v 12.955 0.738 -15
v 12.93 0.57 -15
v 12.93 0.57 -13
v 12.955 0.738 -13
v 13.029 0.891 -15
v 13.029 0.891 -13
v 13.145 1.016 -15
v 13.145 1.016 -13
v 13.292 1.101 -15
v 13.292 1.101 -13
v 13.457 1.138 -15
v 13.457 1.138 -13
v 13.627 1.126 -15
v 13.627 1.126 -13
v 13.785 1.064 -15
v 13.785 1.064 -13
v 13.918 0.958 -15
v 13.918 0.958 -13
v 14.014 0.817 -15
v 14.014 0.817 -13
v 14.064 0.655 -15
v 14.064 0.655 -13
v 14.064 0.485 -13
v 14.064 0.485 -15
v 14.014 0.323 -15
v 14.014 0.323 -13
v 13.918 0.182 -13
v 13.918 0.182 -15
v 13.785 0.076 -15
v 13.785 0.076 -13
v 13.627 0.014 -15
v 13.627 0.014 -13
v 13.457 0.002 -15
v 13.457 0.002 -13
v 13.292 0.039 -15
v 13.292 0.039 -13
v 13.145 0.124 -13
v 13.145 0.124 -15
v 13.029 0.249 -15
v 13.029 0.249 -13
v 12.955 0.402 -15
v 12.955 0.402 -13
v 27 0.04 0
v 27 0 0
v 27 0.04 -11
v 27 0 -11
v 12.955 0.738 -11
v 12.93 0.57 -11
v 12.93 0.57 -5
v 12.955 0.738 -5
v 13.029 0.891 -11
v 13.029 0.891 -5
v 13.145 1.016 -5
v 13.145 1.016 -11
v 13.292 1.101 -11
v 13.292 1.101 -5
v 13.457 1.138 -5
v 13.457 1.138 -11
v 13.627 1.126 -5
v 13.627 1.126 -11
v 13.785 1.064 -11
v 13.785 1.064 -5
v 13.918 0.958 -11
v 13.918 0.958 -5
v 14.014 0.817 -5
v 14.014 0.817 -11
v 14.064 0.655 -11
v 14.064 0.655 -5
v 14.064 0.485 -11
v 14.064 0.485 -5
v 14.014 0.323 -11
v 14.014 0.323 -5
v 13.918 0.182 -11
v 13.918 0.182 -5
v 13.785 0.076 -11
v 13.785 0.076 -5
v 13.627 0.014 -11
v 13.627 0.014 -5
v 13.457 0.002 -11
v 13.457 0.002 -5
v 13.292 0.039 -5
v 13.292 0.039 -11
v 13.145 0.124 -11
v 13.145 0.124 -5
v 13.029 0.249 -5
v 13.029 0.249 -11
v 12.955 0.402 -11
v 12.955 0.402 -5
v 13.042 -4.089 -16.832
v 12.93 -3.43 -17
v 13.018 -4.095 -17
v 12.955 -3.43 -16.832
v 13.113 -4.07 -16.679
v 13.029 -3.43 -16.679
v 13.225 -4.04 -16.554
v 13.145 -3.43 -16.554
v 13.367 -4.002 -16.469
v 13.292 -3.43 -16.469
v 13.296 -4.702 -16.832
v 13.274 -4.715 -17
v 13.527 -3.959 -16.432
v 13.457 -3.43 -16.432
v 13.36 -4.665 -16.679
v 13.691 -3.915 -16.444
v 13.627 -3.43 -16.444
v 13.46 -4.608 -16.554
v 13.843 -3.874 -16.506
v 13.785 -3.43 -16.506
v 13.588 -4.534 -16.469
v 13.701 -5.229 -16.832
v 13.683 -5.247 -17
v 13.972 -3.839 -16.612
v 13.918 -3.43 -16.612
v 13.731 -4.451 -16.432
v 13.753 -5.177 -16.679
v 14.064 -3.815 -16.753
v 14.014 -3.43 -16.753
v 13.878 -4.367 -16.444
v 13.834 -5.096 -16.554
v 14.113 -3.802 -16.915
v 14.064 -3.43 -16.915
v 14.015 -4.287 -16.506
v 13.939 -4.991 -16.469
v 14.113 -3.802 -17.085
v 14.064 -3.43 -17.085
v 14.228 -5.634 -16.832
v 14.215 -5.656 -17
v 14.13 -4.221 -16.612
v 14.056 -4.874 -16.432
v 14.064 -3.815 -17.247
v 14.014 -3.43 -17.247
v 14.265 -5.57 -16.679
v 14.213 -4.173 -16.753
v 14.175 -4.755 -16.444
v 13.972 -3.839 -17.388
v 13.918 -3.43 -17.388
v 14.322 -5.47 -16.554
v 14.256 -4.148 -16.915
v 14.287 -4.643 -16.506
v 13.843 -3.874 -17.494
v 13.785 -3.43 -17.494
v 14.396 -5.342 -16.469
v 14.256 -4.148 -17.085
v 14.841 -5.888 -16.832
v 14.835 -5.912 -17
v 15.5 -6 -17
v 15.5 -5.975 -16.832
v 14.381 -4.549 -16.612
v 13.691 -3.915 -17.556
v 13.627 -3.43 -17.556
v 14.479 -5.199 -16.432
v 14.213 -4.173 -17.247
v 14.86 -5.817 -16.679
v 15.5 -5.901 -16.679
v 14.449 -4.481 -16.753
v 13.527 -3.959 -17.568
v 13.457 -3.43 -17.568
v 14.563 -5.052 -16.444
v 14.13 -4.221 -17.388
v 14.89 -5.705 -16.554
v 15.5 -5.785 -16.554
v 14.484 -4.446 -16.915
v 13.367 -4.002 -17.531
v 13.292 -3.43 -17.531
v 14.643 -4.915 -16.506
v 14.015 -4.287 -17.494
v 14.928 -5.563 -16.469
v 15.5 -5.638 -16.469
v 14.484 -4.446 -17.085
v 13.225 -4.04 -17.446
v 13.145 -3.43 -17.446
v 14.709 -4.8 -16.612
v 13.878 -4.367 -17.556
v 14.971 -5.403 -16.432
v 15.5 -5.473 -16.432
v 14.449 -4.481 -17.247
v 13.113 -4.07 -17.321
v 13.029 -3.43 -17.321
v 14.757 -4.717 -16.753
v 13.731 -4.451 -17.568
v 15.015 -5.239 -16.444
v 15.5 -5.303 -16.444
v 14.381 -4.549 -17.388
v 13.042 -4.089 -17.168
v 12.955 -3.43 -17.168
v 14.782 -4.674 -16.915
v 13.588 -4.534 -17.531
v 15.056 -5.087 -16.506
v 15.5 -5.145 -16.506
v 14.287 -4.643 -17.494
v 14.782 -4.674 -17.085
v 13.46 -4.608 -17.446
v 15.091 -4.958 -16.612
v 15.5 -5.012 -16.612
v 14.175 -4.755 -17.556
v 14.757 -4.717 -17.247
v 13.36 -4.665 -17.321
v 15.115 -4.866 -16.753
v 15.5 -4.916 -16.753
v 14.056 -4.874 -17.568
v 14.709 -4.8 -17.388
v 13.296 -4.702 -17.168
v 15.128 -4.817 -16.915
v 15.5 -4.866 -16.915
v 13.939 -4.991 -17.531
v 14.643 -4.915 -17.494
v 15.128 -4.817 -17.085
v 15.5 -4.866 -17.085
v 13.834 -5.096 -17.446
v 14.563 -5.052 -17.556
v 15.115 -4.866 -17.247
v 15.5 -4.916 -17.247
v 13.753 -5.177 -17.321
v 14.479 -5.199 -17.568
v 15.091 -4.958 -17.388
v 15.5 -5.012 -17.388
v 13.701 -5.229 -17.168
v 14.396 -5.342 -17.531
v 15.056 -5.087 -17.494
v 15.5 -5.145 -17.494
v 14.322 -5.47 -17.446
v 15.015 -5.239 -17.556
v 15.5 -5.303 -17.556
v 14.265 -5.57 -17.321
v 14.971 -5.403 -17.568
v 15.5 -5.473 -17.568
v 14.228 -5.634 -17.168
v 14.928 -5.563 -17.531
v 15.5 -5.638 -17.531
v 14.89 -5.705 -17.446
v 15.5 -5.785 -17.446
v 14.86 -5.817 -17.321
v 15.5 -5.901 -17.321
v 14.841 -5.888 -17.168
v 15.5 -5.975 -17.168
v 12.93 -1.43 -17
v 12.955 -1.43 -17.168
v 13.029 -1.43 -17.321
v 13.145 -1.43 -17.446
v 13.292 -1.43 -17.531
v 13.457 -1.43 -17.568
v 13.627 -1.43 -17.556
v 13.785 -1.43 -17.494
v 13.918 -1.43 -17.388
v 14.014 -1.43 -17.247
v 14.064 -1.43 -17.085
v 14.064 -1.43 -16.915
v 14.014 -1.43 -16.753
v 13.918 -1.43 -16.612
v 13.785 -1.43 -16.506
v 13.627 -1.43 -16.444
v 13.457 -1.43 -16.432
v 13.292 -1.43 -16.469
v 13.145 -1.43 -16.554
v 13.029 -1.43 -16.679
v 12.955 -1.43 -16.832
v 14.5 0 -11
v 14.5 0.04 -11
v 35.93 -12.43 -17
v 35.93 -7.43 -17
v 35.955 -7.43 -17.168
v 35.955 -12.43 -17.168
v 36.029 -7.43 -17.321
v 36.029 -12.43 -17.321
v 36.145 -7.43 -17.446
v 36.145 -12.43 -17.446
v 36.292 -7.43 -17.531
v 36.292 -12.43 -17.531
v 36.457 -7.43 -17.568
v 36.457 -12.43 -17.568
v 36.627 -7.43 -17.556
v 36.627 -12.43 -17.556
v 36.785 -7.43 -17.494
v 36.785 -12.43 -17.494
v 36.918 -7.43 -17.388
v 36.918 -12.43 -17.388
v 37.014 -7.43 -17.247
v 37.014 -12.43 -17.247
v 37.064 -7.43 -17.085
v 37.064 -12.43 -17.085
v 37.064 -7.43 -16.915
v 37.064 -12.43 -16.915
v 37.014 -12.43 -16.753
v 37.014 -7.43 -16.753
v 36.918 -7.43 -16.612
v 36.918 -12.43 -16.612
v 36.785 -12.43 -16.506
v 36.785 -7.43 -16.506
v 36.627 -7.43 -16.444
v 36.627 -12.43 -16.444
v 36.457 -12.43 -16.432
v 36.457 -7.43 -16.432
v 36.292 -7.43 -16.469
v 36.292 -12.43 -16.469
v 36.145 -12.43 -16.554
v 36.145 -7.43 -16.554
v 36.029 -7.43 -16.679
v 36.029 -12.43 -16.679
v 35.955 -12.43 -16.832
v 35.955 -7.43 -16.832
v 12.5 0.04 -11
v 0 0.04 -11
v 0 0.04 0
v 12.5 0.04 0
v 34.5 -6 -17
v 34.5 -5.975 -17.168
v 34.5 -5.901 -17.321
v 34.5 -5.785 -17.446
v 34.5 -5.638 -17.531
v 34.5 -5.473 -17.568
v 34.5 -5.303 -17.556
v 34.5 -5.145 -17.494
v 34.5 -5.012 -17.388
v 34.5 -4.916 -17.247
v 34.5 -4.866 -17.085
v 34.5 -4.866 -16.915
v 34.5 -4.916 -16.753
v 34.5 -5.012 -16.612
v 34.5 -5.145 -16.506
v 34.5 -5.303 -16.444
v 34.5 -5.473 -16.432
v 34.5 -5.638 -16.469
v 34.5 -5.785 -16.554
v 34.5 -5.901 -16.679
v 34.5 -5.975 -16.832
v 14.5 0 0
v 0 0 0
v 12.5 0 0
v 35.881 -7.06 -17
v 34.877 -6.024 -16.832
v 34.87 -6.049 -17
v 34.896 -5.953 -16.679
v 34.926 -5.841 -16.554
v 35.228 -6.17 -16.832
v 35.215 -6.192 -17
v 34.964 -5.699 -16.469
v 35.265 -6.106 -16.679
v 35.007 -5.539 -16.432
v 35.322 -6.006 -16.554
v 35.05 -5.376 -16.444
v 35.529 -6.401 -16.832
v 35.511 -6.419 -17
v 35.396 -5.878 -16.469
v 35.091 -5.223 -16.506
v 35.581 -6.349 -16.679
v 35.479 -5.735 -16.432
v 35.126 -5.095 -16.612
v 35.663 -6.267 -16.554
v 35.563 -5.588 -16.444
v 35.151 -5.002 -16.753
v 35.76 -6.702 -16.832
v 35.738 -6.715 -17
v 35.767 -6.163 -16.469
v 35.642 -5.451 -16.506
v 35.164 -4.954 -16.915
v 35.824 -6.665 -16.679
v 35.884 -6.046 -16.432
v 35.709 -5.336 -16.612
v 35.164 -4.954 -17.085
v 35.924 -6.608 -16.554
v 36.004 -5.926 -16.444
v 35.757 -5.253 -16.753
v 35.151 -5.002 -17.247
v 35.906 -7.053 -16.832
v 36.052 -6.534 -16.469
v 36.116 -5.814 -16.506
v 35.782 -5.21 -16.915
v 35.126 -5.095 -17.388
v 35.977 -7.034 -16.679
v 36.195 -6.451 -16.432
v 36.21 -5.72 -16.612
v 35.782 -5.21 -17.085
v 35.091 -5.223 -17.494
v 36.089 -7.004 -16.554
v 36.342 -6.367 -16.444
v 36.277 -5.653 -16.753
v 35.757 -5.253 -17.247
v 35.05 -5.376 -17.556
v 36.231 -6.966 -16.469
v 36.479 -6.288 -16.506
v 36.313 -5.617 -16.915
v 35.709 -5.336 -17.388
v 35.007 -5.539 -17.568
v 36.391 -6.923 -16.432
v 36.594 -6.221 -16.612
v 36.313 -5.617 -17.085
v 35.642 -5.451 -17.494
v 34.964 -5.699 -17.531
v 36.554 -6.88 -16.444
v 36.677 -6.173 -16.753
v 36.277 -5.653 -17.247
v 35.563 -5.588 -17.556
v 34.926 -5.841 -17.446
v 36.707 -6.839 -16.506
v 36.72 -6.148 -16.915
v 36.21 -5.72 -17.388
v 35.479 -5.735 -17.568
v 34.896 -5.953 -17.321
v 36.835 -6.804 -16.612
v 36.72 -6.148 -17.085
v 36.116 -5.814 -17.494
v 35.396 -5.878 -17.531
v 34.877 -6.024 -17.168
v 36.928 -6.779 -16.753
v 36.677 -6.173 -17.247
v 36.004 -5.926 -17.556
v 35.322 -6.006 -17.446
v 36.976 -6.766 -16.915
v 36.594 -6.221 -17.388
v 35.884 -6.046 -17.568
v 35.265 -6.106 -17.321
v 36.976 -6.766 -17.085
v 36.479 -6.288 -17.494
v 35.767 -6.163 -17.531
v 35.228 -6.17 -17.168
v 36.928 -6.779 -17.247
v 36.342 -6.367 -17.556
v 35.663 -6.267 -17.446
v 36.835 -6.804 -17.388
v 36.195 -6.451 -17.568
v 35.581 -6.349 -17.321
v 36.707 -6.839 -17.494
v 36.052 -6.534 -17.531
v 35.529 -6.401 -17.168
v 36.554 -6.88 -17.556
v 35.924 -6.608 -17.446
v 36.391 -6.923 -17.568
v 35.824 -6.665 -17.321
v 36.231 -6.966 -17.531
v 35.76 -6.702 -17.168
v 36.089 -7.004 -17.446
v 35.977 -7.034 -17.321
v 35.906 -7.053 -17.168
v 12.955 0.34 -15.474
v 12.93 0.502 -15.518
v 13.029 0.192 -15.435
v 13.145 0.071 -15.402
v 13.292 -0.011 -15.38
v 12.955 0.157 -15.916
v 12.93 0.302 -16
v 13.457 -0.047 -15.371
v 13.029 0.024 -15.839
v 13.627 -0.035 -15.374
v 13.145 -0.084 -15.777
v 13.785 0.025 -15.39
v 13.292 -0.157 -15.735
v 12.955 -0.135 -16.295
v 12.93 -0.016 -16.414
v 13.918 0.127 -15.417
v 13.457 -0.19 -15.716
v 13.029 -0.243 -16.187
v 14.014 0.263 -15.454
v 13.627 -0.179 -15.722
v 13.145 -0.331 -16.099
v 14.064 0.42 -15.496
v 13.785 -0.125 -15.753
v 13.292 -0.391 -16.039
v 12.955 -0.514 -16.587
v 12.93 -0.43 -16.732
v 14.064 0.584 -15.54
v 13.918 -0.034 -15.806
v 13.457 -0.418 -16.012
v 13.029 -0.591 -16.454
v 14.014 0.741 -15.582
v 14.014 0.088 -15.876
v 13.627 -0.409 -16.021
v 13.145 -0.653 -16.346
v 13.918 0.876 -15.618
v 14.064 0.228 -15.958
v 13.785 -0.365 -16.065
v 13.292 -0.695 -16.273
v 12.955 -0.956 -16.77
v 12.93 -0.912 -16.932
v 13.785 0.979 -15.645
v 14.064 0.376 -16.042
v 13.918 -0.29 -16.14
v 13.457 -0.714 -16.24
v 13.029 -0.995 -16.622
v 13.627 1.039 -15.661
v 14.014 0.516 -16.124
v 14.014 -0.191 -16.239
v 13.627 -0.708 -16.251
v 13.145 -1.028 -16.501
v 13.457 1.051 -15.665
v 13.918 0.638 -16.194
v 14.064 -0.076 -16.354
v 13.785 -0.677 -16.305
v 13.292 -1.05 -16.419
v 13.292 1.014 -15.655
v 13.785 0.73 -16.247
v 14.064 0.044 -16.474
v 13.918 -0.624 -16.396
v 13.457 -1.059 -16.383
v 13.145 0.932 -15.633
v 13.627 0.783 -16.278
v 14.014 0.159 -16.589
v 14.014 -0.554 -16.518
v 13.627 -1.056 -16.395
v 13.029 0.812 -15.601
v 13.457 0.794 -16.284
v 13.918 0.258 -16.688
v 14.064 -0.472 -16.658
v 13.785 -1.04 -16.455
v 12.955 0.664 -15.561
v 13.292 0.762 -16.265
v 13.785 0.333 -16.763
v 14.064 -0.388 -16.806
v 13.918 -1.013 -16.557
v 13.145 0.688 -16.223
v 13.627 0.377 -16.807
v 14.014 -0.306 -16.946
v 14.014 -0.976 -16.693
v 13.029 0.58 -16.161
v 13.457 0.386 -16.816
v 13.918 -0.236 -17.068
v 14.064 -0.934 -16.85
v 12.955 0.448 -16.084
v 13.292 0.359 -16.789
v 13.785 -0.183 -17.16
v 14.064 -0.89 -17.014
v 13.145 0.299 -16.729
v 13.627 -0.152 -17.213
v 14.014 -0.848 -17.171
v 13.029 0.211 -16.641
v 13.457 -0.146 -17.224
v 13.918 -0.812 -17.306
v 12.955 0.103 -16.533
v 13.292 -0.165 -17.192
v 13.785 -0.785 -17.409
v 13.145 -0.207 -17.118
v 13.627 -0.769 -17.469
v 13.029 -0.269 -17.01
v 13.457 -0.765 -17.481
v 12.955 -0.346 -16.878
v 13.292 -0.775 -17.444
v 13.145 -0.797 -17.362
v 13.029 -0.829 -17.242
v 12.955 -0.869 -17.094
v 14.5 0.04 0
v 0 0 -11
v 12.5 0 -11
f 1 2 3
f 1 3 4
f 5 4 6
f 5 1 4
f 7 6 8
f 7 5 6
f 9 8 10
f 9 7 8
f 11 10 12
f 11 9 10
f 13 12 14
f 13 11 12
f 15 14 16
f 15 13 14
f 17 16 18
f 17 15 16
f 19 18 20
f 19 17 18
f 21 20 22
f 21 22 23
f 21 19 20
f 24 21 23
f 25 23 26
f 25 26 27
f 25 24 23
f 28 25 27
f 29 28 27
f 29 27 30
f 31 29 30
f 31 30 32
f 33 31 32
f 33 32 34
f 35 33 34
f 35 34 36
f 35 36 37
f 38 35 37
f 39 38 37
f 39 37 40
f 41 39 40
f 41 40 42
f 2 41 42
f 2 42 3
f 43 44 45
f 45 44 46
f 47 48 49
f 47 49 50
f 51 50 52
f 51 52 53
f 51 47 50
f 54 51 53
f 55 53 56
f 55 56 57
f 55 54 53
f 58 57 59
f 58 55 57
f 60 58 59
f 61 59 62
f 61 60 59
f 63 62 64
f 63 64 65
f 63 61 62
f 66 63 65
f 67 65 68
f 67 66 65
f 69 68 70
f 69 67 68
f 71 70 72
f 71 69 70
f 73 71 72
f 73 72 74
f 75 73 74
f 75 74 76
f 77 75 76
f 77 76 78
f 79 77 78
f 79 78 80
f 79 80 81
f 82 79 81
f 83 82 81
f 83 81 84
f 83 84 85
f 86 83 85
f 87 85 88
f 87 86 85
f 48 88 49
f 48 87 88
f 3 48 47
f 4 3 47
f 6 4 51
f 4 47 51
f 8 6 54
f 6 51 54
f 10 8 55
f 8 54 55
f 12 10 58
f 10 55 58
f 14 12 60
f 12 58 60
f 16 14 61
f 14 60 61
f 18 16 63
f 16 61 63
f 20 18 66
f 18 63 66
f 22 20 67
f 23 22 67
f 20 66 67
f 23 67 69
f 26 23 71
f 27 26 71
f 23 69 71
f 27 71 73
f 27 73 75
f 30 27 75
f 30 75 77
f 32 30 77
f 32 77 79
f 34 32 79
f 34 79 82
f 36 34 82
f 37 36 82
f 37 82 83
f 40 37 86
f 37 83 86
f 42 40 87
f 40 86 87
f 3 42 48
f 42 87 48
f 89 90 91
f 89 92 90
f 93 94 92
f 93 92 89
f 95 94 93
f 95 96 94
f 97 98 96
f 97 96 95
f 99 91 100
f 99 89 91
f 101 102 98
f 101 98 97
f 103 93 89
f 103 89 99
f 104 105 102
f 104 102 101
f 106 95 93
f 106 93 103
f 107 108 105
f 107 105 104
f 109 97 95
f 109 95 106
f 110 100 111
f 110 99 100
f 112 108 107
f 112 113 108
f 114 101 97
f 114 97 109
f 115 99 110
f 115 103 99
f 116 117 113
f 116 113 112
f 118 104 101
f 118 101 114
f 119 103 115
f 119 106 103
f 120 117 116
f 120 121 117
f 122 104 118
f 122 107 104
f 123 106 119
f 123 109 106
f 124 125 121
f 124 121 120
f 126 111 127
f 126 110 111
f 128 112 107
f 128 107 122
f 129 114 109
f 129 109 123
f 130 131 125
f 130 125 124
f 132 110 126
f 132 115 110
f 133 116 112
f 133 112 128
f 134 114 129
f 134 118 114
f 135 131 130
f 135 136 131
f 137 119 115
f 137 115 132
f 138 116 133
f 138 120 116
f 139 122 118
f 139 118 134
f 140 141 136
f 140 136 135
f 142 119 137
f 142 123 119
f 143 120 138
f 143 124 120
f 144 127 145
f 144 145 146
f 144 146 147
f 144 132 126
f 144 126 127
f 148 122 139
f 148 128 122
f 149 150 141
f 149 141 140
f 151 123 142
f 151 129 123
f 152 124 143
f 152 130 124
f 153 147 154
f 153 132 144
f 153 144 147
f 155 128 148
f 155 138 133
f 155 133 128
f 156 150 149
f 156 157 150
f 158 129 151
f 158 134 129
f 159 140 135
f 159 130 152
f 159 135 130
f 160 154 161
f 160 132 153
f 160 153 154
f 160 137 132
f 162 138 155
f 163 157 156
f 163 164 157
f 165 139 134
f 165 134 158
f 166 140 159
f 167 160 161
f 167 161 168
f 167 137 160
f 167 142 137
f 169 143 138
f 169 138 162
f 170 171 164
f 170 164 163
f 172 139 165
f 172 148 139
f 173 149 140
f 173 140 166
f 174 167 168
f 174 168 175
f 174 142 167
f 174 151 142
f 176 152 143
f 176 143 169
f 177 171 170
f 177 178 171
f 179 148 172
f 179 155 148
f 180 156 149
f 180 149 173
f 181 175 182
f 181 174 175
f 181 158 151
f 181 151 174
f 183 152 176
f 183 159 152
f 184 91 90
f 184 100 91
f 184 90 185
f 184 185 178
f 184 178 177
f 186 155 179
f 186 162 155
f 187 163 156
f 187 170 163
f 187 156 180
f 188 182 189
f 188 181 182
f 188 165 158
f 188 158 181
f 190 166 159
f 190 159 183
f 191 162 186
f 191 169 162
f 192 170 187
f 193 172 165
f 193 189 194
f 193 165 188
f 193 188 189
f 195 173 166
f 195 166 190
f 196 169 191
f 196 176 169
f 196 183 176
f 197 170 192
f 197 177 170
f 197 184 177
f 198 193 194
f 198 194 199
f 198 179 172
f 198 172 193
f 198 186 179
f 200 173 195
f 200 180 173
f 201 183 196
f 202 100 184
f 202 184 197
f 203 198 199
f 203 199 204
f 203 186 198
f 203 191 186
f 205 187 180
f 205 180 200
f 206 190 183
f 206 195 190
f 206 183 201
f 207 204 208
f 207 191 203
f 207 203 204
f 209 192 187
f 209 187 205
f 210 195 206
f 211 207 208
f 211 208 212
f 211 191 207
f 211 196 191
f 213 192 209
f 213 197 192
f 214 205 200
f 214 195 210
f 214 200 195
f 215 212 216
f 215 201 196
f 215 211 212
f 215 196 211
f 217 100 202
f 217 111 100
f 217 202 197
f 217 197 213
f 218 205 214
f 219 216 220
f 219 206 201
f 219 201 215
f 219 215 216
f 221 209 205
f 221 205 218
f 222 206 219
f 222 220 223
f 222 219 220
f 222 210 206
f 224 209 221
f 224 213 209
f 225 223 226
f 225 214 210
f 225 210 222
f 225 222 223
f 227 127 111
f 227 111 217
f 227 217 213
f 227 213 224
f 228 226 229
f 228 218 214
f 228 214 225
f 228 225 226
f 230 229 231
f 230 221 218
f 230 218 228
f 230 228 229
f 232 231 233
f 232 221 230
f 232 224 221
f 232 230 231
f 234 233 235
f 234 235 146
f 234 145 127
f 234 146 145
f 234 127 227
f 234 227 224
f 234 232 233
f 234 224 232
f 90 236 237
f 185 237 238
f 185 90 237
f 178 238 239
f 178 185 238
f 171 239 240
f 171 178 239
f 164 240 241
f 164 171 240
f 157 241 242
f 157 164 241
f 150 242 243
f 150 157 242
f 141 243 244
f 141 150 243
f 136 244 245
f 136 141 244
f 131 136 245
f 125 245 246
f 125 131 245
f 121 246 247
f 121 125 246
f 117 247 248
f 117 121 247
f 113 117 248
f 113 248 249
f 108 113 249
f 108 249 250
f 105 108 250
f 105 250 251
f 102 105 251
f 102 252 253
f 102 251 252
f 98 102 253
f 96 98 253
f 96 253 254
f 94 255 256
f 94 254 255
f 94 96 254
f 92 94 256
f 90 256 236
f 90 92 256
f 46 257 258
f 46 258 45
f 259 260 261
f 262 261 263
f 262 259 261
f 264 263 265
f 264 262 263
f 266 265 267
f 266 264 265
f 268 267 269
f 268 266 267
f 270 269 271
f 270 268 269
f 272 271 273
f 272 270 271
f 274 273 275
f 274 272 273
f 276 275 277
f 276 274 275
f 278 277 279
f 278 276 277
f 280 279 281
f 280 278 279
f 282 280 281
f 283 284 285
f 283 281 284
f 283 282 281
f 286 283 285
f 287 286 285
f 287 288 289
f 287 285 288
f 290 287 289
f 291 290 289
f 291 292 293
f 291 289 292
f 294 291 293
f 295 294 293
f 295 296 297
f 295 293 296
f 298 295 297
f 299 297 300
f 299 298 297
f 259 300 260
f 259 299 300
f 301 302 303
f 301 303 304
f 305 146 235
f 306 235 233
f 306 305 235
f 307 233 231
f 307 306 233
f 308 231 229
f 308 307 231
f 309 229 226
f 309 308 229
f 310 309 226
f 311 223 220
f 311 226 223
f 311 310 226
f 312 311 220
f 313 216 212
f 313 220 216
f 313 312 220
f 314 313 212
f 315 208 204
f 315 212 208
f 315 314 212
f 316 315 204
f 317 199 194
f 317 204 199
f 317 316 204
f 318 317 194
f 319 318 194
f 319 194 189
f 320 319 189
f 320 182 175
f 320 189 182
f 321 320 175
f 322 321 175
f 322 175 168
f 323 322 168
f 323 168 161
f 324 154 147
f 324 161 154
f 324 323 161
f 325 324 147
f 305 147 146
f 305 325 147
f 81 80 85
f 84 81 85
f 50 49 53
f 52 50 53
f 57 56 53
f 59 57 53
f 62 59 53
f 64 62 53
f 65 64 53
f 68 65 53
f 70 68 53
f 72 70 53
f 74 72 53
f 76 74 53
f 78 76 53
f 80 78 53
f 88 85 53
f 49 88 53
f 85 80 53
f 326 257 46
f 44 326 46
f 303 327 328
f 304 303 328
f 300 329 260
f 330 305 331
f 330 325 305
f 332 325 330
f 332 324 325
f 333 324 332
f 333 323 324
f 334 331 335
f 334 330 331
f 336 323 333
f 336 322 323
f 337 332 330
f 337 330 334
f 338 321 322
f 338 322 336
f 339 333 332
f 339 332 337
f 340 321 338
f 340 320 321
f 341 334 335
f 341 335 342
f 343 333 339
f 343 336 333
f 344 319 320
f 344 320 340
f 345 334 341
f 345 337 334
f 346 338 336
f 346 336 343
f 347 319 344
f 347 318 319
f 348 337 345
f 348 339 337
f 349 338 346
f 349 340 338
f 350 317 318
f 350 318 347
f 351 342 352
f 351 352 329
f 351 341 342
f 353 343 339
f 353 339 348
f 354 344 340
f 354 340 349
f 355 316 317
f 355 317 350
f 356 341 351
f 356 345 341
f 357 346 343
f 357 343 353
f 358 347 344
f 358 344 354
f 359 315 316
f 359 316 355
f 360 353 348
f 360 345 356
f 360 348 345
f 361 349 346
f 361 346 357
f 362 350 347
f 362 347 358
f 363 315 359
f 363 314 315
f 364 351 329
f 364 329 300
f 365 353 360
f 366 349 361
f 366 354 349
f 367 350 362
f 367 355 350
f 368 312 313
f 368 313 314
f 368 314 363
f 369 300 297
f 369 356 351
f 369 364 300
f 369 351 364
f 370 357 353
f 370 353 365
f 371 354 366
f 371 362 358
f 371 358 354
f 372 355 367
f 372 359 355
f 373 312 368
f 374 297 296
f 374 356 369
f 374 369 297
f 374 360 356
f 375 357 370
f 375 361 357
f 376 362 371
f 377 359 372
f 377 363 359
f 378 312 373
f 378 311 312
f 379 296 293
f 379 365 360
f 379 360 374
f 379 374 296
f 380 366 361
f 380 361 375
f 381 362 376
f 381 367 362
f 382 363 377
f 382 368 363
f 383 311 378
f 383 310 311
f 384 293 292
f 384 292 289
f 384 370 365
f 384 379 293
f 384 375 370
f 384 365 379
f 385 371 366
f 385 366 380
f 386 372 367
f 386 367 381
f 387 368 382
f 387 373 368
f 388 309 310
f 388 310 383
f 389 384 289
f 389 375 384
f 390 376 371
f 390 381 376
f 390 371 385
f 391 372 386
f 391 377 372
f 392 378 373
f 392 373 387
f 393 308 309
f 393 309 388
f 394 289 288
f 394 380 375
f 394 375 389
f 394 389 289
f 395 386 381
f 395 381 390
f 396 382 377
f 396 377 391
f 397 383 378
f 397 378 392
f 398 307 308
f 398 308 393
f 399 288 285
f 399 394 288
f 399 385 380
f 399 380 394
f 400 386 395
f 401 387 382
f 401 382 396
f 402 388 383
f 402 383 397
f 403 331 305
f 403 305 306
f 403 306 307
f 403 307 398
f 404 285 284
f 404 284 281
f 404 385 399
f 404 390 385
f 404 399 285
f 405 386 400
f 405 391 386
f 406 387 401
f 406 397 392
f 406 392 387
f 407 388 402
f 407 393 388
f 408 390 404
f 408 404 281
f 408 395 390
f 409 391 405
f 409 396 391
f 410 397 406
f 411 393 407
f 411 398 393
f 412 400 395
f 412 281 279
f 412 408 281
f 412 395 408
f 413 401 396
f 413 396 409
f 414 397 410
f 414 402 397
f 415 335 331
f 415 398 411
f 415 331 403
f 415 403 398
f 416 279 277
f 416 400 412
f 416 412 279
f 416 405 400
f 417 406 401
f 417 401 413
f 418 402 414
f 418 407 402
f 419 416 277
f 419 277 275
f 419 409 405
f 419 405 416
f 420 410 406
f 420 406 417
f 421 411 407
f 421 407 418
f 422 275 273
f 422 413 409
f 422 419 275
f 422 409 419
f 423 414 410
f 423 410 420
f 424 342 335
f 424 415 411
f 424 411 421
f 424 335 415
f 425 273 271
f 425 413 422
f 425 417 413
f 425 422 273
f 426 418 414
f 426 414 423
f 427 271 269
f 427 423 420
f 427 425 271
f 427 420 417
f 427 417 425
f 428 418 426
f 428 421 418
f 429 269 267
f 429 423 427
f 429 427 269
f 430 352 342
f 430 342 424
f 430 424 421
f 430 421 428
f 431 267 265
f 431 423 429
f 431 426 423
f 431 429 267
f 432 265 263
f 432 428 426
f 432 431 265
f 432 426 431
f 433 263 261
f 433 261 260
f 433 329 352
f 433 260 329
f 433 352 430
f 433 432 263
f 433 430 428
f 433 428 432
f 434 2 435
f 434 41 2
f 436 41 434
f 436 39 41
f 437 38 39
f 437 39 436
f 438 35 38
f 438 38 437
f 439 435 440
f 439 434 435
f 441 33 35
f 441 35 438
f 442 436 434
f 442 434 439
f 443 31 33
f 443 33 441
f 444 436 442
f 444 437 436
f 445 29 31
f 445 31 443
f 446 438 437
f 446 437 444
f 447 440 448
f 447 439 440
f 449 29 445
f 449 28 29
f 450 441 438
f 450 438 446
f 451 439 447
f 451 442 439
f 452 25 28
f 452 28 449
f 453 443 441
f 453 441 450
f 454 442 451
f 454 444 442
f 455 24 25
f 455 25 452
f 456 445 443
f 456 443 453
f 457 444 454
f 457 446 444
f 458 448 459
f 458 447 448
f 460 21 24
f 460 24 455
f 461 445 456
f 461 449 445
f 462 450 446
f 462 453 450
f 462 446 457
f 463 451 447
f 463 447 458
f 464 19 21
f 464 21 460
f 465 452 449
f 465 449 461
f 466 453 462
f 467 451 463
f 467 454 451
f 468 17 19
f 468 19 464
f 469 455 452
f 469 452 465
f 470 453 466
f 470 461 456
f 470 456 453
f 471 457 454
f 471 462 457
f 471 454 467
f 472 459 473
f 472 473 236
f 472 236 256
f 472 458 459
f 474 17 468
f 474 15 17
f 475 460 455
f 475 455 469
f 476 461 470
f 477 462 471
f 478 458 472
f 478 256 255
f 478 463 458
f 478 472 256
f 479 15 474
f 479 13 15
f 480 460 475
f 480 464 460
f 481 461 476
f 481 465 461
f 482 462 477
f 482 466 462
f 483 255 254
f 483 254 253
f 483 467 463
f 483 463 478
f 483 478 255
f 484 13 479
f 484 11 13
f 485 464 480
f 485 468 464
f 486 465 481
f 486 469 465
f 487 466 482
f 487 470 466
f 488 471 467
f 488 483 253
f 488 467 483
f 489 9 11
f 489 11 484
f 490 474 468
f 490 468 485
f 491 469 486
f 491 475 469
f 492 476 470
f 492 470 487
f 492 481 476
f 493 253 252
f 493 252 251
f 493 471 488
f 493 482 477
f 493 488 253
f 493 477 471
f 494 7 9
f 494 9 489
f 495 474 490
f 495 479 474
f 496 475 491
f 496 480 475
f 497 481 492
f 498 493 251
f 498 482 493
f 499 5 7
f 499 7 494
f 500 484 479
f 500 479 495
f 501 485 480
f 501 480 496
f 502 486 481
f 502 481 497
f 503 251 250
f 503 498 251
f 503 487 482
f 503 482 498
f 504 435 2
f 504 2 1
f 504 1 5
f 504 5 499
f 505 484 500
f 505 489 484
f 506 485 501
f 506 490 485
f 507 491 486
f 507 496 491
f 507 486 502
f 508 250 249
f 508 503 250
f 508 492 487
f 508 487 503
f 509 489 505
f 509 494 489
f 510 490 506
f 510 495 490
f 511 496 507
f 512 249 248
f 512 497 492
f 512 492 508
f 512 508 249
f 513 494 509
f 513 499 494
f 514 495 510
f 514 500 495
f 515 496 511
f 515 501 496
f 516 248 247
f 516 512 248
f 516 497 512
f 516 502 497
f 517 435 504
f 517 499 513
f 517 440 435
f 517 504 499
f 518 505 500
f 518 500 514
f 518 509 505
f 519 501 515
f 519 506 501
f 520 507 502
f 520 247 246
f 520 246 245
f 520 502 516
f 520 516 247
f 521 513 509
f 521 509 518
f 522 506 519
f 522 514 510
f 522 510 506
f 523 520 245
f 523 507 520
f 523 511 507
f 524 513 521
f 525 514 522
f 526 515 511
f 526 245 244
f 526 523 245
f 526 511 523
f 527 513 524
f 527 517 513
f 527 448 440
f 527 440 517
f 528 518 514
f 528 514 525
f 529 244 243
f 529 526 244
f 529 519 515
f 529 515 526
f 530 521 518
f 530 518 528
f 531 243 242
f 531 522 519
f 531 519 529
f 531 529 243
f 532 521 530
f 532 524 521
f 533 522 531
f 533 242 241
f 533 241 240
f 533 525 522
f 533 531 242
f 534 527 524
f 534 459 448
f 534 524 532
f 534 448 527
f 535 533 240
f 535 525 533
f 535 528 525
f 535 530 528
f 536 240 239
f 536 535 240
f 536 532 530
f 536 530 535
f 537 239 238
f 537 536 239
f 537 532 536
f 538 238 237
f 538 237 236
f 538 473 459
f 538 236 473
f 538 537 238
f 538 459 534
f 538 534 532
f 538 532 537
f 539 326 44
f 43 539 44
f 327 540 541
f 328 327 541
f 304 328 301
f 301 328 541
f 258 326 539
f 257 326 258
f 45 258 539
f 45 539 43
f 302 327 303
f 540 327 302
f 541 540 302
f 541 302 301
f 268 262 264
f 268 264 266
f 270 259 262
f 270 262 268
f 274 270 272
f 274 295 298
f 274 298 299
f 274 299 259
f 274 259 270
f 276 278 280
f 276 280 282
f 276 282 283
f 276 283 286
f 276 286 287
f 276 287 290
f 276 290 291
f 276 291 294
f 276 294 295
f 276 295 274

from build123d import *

# Parameters (mm, degrees)
SKETCH_1_W        = 12.5
SKETCH_1_H        = 11
EXTRUDE_1_DEPTH   = 0.04
EXTRUDE_1_2_DEPTH = 0.04
SKETCH_2_R        = 0.57
EXTRUDE_2_DEPTH   = 6
SKETCH_3_R        = 0.57
EXTRUDE_3_DEPTH   = 2
SKETCH_5_R        = 0.57


with BuildPart() as part:
    # Эскиз1 → Бобышка-Вытянуть1 (new body)
    with BuildSketch(Plane(origin=(0, 0, 0), x_dir=(1, 0, 0), z_dir=(0, 1, 0))):
        with Locations((6.25, 5.5)):
            Rectangle(SKETCH_1_W, SKETCH_1_H)
    extrude(amount=EXTRUDE_1_DEPTH)


with BuildPart() as body_2:
    # Эскиз1 → Extrude 1 2 (new body)
    with BuildSketch(Plane(origin=(0, 0, 0), x_dir=(1, 0, 0), z_dir=(0, 1, 0))):
        with Locations((20.75, 5.5)):
            Rectangle(SKETCH_1_W, SKETCH_1_H)
    extrude(amount=EXTRUDE_1_2_DEPTH)


with BuildPart() as body_3:
    # Эскиз2 → Бобышка-Вытянуть2 (new body)
    with BuildSketch(Plane(origin=(0, 0, -11), x_dir=(-1, 0, 0), z_dir=(0, 0, -1))):
        with Locations((-13.5, 0.57)):
            Circle(SKETCH_2_R)
    extrude(amount=-EXTRUDE_2_DEPTH)

    # Эскиз3 → Бобышка-Вытянуть3 (add)
    with BuildSketch(Plane(origin=(0, 0, -11), x_dir=(-1, 0, 0), z_dir=(0, 0, -1))):
        with Locations((-13.5, 0.57)):
            Circle(SKETCH_3_R)
    extrude(amount=EXTRUDE_3_DEPTH)

    # По траектории1: sweep along a curve in space
    with BuildLine() as sweep_1_path:
        Line((13.5, 0.57, -13), (13.5, 0.57, -15))
        ThreePointArc((13.5, -1.43, -17), (13.5, -0.015786438, -16.414213562), (13.5, 0.57, -15))
        Line((13.5, -1.43, -17), (13.5, -3.43, -17))
        ThreePointArc((15.5, -5.43, -17), (14.085786438, -4.844213562, -17), (13.5, -3.43, -17))
        Line((15.5, -5.43, -17), (34.5, -5.43, -17))
        ThreePointArc((36.5, -7.43, -17), (35.914213562, -6.015786438, -17), (34.5, -5.43, -17))
        Line((36.5, -7.43, -17), (36.5, -12.43, -17))
    # Эскиз5 → По траектории1 (sweep)
    with BuildSketch(Plane(origin=(0, 0, -13), x_dir=(-1, 0, 0), z_dir=(0, 0, -1))):
        with Locations((-13.5, 0.57)):
            Circle(SKETCH_5_R)
    sweep(path=sweep_1_path.line)


solid = Compound([part.part, body_2.part, body_3.part])
